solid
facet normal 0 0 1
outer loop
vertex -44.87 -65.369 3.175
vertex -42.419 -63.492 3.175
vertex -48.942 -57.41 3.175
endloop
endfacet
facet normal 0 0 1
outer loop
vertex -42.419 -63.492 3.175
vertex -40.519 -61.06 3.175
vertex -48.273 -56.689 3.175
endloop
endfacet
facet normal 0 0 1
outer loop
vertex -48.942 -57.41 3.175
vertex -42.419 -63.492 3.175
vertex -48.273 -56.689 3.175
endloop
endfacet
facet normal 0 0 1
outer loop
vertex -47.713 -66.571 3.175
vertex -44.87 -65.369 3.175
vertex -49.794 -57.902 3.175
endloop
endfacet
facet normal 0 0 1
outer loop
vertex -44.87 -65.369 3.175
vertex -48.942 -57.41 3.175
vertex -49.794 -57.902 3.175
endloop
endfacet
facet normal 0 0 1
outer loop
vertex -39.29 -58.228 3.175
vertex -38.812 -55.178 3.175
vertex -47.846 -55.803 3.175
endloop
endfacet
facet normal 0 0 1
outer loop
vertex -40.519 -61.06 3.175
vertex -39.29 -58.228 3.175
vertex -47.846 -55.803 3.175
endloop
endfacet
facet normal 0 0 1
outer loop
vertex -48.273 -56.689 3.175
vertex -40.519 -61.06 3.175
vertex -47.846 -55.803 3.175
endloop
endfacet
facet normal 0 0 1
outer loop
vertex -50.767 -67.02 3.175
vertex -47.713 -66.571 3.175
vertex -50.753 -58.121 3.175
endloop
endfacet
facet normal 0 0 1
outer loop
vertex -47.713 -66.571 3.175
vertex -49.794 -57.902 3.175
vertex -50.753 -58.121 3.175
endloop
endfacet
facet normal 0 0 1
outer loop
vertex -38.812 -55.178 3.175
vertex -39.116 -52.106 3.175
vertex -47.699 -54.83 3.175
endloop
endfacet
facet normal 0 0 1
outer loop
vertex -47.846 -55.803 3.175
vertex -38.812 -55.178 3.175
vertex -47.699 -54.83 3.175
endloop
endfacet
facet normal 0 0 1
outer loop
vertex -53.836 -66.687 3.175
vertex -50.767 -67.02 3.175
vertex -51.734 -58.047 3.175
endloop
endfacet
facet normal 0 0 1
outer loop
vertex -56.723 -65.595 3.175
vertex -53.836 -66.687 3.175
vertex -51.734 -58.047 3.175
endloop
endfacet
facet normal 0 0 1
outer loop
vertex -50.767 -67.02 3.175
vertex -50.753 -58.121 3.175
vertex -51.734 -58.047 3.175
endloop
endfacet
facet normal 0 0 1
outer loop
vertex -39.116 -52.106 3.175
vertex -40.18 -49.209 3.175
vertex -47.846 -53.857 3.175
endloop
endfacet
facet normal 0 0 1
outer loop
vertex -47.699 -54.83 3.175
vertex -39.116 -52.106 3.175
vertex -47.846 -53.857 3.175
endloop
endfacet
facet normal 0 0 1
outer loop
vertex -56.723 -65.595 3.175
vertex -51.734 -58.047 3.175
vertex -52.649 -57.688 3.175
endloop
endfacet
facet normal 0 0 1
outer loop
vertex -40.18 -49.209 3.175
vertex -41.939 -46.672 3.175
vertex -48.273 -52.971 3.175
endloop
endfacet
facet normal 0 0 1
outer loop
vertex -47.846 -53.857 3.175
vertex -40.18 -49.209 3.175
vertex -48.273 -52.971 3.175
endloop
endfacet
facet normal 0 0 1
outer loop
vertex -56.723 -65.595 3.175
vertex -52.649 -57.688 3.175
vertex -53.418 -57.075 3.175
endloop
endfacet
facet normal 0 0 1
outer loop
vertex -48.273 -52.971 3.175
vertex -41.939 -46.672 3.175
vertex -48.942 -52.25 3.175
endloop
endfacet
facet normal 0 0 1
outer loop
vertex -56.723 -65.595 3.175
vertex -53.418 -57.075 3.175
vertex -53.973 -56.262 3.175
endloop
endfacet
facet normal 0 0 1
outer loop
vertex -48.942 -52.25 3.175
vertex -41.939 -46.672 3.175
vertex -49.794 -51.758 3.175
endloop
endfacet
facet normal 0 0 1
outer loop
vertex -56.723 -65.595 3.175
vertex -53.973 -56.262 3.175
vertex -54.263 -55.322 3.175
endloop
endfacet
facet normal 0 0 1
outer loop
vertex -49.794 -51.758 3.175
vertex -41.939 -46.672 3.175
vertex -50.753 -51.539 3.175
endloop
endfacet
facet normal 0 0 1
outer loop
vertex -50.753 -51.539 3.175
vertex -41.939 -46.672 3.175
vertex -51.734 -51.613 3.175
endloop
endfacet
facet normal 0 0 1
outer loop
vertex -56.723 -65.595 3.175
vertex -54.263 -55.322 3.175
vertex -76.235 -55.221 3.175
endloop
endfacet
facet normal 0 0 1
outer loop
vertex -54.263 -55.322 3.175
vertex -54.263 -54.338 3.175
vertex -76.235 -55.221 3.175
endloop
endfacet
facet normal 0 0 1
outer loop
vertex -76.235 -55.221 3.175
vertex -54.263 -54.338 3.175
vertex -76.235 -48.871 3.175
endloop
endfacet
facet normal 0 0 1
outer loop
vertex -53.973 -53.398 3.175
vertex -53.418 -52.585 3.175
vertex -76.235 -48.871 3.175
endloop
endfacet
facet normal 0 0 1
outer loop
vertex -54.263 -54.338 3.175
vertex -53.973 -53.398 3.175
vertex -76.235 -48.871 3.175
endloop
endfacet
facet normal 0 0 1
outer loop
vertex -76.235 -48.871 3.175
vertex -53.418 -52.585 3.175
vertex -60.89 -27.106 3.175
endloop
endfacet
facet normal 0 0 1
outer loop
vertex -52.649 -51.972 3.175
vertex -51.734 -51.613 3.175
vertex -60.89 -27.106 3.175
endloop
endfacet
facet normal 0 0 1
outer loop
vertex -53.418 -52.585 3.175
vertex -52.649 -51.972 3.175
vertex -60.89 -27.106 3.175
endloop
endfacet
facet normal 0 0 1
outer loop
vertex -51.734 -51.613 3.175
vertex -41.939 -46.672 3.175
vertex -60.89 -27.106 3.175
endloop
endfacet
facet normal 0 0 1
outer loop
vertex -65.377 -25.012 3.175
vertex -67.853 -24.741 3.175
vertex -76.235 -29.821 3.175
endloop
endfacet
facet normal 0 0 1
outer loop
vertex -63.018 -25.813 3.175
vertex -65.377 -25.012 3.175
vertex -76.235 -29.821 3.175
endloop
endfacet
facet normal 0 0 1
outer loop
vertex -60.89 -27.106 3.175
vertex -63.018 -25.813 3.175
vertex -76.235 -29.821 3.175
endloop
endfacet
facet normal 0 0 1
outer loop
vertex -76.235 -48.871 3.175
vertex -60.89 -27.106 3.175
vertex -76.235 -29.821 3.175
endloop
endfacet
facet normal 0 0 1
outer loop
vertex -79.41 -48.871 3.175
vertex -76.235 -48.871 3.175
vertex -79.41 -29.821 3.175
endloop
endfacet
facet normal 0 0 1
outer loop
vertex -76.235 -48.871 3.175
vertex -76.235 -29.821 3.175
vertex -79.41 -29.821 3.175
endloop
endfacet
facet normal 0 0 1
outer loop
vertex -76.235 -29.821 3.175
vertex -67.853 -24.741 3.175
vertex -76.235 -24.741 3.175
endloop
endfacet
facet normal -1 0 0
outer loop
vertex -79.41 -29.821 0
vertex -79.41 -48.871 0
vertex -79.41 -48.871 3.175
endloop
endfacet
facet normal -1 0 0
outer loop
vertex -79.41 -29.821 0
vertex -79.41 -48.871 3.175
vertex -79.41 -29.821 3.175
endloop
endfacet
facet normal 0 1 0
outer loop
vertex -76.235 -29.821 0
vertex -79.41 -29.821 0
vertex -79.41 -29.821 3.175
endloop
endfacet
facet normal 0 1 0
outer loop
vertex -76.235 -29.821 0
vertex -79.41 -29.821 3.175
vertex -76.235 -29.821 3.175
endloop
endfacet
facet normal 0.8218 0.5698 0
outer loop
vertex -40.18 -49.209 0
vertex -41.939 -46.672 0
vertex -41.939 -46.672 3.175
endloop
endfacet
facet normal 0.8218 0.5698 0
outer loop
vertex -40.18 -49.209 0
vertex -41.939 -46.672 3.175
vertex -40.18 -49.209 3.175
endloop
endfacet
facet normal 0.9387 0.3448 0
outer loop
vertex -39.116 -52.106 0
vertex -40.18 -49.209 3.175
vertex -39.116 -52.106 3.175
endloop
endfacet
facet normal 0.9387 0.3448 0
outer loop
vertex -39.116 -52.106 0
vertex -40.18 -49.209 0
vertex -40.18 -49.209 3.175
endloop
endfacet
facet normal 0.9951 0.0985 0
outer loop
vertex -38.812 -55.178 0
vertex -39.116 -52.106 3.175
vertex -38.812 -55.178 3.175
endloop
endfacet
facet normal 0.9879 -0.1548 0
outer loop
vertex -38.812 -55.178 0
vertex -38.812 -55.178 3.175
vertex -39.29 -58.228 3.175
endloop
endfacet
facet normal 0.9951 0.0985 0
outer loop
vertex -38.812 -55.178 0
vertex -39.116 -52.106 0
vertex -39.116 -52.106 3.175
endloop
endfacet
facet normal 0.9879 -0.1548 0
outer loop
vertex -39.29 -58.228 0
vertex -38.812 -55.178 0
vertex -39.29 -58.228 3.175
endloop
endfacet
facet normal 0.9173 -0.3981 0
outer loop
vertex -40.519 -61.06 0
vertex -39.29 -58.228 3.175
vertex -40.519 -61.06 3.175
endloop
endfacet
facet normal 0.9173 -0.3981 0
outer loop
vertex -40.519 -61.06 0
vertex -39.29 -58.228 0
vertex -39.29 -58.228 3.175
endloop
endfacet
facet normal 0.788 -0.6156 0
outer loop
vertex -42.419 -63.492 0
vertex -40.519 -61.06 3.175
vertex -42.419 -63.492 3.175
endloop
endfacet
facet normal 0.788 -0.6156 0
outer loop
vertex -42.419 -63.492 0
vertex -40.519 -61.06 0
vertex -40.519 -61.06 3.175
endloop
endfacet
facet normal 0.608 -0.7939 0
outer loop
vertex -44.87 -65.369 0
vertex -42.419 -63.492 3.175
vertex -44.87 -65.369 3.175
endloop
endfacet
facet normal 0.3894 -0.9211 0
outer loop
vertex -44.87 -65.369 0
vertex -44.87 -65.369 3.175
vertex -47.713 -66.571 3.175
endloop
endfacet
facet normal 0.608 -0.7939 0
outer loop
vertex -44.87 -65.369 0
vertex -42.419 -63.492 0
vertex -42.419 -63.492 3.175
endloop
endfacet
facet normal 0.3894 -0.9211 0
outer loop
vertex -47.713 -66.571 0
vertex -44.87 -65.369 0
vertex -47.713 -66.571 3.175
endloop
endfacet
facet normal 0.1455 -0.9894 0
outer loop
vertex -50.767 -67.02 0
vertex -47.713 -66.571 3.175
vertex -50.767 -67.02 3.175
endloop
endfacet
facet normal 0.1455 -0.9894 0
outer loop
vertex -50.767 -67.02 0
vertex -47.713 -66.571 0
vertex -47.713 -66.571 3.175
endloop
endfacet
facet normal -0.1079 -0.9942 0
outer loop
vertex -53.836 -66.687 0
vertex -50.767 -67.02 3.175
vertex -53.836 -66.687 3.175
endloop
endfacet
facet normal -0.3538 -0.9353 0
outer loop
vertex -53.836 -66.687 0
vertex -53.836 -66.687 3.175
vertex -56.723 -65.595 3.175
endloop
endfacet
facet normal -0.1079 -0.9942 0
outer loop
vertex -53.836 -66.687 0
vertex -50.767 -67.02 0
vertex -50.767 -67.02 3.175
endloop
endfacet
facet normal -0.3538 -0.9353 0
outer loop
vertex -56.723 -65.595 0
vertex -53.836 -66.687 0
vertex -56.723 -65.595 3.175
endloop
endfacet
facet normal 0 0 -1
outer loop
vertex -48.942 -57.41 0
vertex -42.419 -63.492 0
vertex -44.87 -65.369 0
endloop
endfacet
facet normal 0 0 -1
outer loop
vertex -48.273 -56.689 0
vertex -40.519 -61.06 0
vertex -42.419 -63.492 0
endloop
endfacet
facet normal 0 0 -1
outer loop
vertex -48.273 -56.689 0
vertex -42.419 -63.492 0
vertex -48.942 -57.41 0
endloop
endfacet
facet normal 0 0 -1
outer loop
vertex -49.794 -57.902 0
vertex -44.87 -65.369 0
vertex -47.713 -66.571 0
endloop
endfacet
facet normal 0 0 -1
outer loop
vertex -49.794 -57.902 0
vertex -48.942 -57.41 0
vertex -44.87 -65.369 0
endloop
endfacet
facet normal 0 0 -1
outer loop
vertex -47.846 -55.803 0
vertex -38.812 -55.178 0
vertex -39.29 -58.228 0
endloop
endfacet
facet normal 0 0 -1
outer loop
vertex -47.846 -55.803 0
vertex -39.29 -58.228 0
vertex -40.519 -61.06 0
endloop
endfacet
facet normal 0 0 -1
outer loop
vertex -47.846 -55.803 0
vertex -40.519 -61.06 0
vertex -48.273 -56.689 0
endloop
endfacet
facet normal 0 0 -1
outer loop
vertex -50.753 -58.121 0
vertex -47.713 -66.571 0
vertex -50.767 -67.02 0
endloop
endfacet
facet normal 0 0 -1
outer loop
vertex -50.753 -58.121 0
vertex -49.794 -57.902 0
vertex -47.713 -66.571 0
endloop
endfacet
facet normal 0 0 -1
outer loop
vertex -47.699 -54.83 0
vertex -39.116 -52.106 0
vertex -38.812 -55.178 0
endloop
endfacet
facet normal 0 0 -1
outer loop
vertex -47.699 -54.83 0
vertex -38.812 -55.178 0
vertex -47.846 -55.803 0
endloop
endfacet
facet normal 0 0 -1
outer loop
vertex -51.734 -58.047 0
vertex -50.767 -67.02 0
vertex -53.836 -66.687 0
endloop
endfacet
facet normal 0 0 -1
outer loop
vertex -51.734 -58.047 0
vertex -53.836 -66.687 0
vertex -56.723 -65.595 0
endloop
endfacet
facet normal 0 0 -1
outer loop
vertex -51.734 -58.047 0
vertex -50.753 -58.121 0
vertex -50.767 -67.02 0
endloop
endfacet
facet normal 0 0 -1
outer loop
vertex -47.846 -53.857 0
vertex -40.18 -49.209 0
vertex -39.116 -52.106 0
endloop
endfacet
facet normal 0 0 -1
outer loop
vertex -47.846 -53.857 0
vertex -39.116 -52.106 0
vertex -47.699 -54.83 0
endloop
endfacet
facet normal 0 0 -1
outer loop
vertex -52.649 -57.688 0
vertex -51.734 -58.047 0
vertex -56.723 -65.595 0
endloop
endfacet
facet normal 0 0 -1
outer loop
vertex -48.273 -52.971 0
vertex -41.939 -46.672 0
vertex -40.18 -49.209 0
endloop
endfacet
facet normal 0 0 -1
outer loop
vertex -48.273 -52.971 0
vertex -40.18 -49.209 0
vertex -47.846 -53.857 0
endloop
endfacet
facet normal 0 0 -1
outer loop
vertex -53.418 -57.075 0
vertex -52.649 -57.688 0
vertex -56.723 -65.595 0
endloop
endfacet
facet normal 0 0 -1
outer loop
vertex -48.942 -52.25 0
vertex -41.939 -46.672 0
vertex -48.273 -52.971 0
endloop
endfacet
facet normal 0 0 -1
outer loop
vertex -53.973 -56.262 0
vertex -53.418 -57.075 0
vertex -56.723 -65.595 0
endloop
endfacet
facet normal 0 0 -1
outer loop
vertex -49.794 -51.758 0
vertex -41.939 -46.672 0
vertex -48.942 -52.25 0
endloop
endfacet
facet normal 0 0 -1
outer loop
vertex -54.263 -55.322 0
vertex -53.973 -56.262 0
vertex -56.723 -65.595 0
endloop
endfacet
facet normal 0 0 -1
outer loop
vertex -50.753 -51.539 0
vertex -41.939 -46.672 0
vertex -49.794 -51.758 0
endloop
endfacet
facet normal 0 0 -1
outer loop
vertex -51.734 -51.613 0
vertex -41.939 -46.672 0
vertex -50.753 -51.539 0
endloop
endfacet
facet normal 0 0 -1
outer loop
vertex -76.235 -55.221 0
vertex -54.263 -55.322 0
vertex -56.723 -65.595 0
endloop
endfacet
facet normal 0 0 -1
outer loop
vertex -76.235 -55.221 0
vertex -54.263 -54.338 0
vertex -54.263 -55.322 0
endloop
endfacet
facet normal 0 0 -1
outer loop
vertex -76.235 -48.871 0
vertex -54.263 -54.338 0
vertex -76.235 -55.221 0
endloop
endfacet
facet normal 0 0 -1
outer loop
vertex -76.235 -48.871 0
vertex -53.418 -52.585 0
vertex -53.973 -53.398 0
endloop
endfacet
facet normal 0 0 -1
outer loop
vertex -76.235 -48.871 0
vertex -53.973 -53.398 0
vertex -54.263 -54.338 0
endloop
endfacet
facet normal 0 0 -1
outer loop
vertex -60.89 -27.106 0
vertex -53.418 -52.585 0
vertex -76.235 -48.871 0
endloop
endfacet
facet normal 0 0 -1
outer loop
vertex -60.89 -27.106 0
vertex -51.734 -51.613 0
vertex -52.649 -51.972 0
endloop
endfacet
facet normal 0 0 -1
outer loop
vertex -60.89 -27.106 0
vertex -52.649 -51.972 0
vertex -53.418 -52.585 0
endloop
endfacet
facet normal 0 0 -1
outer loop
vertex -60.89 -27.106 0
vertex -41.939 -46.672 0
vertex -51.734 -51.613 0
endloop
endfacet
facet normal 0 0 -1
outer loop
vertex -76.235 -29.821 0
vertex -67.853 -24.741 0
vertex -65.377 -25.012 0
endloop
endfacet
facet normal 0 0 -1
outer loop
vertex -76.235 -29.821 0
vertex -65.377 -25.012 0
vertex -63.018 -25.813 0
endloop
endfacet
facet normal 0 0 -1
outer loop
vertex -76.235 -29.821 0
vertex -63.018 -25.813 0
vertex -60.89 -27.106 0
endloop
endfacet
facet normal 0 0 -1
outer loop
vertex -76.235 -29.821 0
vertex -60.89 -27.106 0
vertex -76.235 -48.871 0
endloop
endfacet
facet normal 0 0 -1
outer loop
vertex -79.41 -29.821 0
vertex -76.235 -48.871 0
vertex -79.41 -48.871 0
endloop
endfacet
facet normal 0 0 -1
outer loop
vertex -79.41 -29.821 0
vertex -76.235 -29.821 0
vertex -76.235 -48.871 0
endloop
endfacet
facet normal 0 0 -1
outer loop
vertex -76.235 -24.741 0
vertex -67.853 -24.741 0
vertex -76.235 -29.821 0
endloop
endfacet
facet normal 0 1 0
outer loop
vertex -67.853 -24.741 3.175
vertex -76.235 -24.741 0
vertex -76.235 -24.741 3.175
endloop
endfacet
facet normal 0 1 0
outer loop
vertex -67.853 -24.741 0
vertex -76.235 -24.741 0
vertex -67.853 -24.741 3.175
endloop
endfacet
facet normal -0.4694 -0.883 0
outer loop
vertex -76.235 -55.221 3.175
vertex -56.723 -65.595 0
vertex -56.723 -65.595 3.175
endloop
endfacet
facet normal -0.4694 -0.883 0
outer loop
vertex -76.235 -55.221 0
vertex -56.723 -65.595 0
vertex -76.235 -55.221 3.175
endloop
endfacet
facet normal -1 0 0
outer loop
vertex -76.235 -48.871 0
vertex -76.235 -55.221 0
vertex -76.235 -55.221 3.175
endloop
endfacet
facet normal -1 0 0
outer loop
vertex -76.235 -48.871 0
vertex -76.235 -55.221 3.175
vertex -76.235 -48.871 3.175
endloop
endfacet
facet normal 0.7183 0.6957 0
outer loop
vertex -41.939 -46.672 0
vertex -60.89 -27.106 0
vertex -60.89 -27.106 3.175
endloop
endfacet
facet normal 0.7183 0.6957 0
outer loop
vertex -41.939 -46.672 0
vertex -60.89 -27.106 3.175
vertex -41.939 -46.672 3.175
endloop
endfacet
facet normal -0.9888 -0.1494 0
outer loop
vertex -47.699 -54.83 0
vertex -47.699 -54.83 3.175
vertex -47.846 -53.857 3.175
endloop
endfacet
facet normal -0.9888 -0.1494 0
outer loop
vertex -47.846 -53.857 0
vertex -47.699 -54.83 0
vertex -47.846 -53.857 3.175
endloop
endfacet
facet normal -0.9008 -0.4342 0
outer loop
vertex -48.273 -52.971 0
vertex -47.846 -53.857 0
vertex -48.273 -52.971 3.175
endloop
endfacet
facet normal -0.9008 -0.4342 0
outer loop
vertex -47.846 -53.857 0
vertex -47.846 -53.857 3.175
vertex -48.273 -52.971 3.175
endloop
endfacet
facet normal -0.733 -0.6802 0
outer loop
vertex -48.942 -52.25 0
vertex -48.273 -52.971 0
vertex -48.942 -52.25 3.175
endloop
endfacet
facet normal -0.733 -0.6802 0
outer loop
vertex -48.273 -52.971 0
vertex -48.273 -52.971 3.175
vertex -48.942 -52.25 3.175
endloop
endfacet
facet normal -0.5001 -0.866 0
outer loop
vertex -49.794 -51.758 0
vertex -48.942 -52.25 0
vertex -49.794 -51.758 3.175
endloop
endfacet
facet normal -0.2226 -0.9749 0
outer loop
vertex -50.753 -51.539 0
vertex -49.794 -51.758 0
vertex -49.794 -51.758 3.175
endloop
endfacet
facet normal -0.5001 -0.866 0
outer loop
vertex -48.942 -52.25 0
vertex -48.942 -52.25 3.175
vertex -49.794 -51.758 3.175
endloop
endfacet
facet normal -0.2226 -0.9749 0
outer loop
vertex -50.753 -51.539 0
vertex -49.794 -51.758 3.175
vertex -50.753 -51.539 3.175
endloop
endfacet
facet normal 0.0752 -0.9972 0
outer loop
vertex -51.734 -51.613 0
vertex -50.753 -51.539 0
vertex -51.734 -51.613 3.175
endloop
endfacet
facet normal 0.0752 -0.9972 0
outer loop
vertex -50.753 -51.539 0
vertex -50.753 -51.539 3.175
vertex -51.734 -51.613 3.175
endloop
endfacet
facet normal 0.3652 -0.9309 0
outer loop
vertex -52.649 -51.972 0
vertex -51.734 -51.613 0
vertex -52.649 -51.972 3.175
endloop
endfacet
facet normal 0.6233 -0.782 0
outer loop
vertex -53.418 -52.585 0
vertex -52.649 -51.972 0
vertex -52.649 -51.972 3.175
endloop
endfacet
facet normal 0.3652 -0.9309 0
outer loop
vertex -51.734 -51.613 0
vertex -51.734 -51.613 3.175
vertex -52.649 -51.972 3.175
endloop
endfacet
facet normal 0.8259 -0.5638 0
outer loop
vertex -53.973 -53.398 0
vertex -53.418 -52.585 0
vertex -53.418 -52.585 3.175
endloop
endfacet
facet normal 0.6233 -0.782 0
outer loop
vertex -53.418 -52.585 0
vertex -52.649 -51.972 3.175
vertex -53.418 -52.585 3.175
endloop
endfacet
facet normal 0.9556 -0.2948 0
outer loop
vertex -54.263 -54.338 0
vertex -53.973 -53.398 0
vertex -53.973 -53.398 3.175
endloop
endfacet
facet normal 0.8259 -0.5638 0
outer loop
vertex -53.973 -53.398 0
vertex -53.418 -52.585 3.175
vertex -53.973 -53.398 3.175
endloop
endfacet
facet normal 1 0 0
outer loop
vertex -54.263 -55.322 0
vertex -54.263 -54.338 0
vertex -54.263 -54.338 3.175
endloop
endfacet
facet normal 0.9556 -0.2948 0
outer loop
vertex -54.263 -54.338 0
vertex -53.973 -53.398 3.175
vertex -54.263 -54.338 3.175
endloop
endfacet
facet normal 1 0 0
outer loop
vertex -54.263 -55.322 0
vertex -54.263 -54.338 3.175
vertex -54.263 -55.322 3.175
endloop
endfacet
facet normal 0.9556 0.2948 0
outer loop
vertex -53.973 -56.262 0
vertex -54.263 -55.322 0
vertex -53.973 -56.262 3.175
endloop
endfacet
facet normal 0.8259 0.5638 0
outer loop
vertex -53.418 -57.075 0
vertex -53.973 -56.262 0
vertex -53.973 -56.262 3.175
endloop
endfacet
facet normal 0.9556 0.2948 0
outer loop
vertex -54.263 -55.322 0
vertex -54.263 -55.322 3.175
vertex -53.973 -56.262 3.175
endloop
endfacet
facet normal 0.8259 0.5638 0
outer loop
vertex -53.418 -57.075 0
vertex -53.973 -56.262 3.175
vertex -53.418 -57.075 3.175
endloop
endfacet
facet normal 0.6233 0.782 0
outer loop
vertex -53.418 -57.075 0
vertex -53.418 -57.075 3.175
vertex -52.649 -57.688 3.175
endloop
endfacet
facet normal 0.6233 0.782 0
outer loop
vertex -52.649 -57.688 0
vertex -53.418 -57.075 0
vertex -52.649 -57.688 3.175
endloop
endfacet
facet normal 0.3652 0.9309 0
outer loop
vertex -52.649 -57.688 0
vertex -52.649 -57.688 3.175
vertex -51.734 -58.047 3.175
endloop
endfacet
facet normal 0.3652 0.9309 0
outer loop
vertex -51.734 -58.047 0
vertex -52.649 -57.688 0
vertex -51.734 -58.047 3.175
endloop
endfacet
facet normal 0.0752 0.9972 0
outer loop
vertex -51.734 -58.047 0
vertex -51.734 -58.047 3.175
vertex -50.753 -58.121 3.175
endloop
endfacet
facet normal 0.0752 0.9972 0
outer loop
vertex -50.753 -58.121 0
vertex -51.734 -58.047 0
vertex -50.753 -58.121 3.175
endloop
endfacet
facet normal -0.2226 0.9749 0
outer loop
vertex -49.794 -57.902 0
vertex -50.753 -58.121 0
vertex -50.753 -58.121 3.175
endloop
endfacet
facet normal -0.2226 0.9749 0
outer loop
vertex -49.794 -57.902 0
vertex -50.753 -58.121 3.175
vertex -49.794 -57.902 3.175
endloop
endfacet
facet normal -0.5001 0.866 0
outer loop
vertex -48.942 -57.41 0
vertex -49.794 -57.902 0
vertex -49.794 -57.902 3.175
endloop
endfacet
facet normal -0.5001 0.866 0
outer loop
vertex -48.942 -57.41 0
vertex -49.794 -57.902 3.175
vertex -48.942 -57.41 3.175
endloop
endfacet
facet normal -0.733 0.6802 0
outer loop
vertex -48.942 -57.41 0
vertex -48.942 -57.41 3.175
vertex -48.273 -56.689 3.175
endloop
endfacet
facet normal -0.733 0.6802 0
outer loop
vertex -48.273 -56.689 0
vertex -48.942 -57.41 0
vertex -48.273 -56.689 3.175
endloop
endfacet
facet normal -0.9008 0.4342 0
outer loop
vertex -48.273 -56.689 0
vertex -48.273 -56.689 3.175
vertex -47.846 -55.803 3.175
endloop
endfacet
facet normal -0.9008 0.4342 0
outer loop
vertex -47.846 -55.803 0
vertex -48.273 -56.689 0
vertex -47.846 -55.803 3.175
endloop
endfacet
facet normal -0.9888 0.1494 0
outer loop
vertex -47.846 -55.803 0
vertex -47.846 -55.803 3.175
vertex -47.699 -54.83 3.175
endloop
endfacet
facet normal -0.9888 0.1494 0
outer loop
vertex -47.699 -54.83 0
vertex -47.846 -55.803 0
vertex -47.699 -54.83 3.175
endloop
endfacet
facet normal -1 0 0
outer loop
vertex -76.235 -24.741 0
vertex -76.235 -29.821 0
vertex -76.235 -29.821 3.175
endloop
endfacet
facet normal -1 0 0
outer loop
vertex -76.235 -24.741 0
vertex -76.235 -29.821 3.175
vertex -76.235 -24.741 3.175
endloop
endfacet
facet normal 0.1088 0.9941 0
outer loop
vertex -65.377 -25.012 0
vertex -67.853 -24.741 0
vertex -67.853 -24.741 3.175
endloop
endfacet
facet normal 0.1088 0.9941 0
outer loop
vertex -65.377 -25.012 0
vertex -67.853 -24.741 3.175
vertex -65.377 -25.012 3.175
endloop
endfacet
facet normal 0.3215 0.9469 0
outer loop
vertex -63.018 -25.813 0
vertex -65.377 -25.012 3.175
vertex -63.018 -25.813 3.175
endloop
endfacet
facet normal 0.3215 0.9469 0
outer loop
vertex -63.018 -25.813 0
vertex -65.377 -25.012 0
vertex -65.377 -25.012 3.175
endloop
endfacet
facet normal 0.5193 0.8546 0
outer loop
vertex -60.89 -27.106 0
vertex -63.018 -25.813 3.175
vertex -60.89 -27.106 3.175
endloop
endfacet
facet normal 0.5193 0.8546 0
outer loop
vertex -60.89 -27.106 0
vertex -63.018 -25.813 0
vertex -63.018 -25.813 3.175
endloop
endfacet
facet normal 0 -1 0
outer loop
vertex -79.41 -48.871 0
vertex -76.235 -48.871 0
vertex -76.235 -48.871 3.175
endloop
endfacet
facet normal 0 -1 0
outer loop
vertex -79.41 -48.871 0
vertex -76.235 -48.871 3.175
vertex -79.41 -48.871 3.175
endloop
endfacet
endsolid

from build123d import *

# Parameters (mm, degrees)
BOSS_EXTRUDE1_DEPTH      = 3.175
M6_CLEARANCE_HOLE1_D     = 6.6
M6_CLEARANCE_HOLE1_DEPTH = 3.302
M6_CLEARANCE_HOLE1_TIP   = 1.982840043


with BuildPart() as part:
    # Sketch1 → Boss-Extrude1 (new body)
    with BuildSketch(Plane.XY):
        with BuildLine():
            Line((-79.409543338, -48.870574021), (-79.409543338, -29.820574021))
            Line((-79.409543338, -29.820574021), (-76.234543338, -29.820574021))
            Line((-76.234543338, -29.820574021), (-76.234543338, -24.740574021))
            Line((-76.234543338, -24.740574021), (-67.852543338, -24.740574021))
            ThreePointArc((-67.852543338, -24.740574021), (-64.175656813, -25.348124877), (-60.889653149, -27.10618986))
            Line((-60.889653149, -27.10618986), (-41.938948425, -46.672019211))
            ThreePointArc((-41.938948425, -46.672019211), (-41.391943029, -62.336204271), (-56.723167431, -65.594956616))
            Line((-56.723167431, -65.594956616), (-76.234543338, -55.220574021))
            Line((-76.234543338, -55.220574021), (-76.234543338, -48.870574021))
            Line((-76.234543338, -48.870574021), (-79.409543338, -48.870574021))
        make_face()
    extrude(amount=BOSS_EXTRUDE1_DEPTH)

    # M6 Clearance Hole1
    with Locations(Plane(origin=(0, 0, 0), x_dir=(-1, 0, 0), z_dir=(0, 0, -1))):
        with Locations((50.999370137, -54.830059564)):
            Hole(M6_CLEARANCE_HOLE1_D / 2, depth=M6_CLEARANCE_HOLE1_DEPTH)
            with Locations((0, 0, -(M6_CLEARANCE_HOLE1_DEPTH + M6_CLEARANCE_HOLE1_TIP / 2))):  # 118° drill point
                Cone(0, M6_CLEARANCE_HOLE1_D / 2, M6_CLEARANCE_HOLE1_TIP, mode=Mode.SUBTRACT)


solid = part.part
